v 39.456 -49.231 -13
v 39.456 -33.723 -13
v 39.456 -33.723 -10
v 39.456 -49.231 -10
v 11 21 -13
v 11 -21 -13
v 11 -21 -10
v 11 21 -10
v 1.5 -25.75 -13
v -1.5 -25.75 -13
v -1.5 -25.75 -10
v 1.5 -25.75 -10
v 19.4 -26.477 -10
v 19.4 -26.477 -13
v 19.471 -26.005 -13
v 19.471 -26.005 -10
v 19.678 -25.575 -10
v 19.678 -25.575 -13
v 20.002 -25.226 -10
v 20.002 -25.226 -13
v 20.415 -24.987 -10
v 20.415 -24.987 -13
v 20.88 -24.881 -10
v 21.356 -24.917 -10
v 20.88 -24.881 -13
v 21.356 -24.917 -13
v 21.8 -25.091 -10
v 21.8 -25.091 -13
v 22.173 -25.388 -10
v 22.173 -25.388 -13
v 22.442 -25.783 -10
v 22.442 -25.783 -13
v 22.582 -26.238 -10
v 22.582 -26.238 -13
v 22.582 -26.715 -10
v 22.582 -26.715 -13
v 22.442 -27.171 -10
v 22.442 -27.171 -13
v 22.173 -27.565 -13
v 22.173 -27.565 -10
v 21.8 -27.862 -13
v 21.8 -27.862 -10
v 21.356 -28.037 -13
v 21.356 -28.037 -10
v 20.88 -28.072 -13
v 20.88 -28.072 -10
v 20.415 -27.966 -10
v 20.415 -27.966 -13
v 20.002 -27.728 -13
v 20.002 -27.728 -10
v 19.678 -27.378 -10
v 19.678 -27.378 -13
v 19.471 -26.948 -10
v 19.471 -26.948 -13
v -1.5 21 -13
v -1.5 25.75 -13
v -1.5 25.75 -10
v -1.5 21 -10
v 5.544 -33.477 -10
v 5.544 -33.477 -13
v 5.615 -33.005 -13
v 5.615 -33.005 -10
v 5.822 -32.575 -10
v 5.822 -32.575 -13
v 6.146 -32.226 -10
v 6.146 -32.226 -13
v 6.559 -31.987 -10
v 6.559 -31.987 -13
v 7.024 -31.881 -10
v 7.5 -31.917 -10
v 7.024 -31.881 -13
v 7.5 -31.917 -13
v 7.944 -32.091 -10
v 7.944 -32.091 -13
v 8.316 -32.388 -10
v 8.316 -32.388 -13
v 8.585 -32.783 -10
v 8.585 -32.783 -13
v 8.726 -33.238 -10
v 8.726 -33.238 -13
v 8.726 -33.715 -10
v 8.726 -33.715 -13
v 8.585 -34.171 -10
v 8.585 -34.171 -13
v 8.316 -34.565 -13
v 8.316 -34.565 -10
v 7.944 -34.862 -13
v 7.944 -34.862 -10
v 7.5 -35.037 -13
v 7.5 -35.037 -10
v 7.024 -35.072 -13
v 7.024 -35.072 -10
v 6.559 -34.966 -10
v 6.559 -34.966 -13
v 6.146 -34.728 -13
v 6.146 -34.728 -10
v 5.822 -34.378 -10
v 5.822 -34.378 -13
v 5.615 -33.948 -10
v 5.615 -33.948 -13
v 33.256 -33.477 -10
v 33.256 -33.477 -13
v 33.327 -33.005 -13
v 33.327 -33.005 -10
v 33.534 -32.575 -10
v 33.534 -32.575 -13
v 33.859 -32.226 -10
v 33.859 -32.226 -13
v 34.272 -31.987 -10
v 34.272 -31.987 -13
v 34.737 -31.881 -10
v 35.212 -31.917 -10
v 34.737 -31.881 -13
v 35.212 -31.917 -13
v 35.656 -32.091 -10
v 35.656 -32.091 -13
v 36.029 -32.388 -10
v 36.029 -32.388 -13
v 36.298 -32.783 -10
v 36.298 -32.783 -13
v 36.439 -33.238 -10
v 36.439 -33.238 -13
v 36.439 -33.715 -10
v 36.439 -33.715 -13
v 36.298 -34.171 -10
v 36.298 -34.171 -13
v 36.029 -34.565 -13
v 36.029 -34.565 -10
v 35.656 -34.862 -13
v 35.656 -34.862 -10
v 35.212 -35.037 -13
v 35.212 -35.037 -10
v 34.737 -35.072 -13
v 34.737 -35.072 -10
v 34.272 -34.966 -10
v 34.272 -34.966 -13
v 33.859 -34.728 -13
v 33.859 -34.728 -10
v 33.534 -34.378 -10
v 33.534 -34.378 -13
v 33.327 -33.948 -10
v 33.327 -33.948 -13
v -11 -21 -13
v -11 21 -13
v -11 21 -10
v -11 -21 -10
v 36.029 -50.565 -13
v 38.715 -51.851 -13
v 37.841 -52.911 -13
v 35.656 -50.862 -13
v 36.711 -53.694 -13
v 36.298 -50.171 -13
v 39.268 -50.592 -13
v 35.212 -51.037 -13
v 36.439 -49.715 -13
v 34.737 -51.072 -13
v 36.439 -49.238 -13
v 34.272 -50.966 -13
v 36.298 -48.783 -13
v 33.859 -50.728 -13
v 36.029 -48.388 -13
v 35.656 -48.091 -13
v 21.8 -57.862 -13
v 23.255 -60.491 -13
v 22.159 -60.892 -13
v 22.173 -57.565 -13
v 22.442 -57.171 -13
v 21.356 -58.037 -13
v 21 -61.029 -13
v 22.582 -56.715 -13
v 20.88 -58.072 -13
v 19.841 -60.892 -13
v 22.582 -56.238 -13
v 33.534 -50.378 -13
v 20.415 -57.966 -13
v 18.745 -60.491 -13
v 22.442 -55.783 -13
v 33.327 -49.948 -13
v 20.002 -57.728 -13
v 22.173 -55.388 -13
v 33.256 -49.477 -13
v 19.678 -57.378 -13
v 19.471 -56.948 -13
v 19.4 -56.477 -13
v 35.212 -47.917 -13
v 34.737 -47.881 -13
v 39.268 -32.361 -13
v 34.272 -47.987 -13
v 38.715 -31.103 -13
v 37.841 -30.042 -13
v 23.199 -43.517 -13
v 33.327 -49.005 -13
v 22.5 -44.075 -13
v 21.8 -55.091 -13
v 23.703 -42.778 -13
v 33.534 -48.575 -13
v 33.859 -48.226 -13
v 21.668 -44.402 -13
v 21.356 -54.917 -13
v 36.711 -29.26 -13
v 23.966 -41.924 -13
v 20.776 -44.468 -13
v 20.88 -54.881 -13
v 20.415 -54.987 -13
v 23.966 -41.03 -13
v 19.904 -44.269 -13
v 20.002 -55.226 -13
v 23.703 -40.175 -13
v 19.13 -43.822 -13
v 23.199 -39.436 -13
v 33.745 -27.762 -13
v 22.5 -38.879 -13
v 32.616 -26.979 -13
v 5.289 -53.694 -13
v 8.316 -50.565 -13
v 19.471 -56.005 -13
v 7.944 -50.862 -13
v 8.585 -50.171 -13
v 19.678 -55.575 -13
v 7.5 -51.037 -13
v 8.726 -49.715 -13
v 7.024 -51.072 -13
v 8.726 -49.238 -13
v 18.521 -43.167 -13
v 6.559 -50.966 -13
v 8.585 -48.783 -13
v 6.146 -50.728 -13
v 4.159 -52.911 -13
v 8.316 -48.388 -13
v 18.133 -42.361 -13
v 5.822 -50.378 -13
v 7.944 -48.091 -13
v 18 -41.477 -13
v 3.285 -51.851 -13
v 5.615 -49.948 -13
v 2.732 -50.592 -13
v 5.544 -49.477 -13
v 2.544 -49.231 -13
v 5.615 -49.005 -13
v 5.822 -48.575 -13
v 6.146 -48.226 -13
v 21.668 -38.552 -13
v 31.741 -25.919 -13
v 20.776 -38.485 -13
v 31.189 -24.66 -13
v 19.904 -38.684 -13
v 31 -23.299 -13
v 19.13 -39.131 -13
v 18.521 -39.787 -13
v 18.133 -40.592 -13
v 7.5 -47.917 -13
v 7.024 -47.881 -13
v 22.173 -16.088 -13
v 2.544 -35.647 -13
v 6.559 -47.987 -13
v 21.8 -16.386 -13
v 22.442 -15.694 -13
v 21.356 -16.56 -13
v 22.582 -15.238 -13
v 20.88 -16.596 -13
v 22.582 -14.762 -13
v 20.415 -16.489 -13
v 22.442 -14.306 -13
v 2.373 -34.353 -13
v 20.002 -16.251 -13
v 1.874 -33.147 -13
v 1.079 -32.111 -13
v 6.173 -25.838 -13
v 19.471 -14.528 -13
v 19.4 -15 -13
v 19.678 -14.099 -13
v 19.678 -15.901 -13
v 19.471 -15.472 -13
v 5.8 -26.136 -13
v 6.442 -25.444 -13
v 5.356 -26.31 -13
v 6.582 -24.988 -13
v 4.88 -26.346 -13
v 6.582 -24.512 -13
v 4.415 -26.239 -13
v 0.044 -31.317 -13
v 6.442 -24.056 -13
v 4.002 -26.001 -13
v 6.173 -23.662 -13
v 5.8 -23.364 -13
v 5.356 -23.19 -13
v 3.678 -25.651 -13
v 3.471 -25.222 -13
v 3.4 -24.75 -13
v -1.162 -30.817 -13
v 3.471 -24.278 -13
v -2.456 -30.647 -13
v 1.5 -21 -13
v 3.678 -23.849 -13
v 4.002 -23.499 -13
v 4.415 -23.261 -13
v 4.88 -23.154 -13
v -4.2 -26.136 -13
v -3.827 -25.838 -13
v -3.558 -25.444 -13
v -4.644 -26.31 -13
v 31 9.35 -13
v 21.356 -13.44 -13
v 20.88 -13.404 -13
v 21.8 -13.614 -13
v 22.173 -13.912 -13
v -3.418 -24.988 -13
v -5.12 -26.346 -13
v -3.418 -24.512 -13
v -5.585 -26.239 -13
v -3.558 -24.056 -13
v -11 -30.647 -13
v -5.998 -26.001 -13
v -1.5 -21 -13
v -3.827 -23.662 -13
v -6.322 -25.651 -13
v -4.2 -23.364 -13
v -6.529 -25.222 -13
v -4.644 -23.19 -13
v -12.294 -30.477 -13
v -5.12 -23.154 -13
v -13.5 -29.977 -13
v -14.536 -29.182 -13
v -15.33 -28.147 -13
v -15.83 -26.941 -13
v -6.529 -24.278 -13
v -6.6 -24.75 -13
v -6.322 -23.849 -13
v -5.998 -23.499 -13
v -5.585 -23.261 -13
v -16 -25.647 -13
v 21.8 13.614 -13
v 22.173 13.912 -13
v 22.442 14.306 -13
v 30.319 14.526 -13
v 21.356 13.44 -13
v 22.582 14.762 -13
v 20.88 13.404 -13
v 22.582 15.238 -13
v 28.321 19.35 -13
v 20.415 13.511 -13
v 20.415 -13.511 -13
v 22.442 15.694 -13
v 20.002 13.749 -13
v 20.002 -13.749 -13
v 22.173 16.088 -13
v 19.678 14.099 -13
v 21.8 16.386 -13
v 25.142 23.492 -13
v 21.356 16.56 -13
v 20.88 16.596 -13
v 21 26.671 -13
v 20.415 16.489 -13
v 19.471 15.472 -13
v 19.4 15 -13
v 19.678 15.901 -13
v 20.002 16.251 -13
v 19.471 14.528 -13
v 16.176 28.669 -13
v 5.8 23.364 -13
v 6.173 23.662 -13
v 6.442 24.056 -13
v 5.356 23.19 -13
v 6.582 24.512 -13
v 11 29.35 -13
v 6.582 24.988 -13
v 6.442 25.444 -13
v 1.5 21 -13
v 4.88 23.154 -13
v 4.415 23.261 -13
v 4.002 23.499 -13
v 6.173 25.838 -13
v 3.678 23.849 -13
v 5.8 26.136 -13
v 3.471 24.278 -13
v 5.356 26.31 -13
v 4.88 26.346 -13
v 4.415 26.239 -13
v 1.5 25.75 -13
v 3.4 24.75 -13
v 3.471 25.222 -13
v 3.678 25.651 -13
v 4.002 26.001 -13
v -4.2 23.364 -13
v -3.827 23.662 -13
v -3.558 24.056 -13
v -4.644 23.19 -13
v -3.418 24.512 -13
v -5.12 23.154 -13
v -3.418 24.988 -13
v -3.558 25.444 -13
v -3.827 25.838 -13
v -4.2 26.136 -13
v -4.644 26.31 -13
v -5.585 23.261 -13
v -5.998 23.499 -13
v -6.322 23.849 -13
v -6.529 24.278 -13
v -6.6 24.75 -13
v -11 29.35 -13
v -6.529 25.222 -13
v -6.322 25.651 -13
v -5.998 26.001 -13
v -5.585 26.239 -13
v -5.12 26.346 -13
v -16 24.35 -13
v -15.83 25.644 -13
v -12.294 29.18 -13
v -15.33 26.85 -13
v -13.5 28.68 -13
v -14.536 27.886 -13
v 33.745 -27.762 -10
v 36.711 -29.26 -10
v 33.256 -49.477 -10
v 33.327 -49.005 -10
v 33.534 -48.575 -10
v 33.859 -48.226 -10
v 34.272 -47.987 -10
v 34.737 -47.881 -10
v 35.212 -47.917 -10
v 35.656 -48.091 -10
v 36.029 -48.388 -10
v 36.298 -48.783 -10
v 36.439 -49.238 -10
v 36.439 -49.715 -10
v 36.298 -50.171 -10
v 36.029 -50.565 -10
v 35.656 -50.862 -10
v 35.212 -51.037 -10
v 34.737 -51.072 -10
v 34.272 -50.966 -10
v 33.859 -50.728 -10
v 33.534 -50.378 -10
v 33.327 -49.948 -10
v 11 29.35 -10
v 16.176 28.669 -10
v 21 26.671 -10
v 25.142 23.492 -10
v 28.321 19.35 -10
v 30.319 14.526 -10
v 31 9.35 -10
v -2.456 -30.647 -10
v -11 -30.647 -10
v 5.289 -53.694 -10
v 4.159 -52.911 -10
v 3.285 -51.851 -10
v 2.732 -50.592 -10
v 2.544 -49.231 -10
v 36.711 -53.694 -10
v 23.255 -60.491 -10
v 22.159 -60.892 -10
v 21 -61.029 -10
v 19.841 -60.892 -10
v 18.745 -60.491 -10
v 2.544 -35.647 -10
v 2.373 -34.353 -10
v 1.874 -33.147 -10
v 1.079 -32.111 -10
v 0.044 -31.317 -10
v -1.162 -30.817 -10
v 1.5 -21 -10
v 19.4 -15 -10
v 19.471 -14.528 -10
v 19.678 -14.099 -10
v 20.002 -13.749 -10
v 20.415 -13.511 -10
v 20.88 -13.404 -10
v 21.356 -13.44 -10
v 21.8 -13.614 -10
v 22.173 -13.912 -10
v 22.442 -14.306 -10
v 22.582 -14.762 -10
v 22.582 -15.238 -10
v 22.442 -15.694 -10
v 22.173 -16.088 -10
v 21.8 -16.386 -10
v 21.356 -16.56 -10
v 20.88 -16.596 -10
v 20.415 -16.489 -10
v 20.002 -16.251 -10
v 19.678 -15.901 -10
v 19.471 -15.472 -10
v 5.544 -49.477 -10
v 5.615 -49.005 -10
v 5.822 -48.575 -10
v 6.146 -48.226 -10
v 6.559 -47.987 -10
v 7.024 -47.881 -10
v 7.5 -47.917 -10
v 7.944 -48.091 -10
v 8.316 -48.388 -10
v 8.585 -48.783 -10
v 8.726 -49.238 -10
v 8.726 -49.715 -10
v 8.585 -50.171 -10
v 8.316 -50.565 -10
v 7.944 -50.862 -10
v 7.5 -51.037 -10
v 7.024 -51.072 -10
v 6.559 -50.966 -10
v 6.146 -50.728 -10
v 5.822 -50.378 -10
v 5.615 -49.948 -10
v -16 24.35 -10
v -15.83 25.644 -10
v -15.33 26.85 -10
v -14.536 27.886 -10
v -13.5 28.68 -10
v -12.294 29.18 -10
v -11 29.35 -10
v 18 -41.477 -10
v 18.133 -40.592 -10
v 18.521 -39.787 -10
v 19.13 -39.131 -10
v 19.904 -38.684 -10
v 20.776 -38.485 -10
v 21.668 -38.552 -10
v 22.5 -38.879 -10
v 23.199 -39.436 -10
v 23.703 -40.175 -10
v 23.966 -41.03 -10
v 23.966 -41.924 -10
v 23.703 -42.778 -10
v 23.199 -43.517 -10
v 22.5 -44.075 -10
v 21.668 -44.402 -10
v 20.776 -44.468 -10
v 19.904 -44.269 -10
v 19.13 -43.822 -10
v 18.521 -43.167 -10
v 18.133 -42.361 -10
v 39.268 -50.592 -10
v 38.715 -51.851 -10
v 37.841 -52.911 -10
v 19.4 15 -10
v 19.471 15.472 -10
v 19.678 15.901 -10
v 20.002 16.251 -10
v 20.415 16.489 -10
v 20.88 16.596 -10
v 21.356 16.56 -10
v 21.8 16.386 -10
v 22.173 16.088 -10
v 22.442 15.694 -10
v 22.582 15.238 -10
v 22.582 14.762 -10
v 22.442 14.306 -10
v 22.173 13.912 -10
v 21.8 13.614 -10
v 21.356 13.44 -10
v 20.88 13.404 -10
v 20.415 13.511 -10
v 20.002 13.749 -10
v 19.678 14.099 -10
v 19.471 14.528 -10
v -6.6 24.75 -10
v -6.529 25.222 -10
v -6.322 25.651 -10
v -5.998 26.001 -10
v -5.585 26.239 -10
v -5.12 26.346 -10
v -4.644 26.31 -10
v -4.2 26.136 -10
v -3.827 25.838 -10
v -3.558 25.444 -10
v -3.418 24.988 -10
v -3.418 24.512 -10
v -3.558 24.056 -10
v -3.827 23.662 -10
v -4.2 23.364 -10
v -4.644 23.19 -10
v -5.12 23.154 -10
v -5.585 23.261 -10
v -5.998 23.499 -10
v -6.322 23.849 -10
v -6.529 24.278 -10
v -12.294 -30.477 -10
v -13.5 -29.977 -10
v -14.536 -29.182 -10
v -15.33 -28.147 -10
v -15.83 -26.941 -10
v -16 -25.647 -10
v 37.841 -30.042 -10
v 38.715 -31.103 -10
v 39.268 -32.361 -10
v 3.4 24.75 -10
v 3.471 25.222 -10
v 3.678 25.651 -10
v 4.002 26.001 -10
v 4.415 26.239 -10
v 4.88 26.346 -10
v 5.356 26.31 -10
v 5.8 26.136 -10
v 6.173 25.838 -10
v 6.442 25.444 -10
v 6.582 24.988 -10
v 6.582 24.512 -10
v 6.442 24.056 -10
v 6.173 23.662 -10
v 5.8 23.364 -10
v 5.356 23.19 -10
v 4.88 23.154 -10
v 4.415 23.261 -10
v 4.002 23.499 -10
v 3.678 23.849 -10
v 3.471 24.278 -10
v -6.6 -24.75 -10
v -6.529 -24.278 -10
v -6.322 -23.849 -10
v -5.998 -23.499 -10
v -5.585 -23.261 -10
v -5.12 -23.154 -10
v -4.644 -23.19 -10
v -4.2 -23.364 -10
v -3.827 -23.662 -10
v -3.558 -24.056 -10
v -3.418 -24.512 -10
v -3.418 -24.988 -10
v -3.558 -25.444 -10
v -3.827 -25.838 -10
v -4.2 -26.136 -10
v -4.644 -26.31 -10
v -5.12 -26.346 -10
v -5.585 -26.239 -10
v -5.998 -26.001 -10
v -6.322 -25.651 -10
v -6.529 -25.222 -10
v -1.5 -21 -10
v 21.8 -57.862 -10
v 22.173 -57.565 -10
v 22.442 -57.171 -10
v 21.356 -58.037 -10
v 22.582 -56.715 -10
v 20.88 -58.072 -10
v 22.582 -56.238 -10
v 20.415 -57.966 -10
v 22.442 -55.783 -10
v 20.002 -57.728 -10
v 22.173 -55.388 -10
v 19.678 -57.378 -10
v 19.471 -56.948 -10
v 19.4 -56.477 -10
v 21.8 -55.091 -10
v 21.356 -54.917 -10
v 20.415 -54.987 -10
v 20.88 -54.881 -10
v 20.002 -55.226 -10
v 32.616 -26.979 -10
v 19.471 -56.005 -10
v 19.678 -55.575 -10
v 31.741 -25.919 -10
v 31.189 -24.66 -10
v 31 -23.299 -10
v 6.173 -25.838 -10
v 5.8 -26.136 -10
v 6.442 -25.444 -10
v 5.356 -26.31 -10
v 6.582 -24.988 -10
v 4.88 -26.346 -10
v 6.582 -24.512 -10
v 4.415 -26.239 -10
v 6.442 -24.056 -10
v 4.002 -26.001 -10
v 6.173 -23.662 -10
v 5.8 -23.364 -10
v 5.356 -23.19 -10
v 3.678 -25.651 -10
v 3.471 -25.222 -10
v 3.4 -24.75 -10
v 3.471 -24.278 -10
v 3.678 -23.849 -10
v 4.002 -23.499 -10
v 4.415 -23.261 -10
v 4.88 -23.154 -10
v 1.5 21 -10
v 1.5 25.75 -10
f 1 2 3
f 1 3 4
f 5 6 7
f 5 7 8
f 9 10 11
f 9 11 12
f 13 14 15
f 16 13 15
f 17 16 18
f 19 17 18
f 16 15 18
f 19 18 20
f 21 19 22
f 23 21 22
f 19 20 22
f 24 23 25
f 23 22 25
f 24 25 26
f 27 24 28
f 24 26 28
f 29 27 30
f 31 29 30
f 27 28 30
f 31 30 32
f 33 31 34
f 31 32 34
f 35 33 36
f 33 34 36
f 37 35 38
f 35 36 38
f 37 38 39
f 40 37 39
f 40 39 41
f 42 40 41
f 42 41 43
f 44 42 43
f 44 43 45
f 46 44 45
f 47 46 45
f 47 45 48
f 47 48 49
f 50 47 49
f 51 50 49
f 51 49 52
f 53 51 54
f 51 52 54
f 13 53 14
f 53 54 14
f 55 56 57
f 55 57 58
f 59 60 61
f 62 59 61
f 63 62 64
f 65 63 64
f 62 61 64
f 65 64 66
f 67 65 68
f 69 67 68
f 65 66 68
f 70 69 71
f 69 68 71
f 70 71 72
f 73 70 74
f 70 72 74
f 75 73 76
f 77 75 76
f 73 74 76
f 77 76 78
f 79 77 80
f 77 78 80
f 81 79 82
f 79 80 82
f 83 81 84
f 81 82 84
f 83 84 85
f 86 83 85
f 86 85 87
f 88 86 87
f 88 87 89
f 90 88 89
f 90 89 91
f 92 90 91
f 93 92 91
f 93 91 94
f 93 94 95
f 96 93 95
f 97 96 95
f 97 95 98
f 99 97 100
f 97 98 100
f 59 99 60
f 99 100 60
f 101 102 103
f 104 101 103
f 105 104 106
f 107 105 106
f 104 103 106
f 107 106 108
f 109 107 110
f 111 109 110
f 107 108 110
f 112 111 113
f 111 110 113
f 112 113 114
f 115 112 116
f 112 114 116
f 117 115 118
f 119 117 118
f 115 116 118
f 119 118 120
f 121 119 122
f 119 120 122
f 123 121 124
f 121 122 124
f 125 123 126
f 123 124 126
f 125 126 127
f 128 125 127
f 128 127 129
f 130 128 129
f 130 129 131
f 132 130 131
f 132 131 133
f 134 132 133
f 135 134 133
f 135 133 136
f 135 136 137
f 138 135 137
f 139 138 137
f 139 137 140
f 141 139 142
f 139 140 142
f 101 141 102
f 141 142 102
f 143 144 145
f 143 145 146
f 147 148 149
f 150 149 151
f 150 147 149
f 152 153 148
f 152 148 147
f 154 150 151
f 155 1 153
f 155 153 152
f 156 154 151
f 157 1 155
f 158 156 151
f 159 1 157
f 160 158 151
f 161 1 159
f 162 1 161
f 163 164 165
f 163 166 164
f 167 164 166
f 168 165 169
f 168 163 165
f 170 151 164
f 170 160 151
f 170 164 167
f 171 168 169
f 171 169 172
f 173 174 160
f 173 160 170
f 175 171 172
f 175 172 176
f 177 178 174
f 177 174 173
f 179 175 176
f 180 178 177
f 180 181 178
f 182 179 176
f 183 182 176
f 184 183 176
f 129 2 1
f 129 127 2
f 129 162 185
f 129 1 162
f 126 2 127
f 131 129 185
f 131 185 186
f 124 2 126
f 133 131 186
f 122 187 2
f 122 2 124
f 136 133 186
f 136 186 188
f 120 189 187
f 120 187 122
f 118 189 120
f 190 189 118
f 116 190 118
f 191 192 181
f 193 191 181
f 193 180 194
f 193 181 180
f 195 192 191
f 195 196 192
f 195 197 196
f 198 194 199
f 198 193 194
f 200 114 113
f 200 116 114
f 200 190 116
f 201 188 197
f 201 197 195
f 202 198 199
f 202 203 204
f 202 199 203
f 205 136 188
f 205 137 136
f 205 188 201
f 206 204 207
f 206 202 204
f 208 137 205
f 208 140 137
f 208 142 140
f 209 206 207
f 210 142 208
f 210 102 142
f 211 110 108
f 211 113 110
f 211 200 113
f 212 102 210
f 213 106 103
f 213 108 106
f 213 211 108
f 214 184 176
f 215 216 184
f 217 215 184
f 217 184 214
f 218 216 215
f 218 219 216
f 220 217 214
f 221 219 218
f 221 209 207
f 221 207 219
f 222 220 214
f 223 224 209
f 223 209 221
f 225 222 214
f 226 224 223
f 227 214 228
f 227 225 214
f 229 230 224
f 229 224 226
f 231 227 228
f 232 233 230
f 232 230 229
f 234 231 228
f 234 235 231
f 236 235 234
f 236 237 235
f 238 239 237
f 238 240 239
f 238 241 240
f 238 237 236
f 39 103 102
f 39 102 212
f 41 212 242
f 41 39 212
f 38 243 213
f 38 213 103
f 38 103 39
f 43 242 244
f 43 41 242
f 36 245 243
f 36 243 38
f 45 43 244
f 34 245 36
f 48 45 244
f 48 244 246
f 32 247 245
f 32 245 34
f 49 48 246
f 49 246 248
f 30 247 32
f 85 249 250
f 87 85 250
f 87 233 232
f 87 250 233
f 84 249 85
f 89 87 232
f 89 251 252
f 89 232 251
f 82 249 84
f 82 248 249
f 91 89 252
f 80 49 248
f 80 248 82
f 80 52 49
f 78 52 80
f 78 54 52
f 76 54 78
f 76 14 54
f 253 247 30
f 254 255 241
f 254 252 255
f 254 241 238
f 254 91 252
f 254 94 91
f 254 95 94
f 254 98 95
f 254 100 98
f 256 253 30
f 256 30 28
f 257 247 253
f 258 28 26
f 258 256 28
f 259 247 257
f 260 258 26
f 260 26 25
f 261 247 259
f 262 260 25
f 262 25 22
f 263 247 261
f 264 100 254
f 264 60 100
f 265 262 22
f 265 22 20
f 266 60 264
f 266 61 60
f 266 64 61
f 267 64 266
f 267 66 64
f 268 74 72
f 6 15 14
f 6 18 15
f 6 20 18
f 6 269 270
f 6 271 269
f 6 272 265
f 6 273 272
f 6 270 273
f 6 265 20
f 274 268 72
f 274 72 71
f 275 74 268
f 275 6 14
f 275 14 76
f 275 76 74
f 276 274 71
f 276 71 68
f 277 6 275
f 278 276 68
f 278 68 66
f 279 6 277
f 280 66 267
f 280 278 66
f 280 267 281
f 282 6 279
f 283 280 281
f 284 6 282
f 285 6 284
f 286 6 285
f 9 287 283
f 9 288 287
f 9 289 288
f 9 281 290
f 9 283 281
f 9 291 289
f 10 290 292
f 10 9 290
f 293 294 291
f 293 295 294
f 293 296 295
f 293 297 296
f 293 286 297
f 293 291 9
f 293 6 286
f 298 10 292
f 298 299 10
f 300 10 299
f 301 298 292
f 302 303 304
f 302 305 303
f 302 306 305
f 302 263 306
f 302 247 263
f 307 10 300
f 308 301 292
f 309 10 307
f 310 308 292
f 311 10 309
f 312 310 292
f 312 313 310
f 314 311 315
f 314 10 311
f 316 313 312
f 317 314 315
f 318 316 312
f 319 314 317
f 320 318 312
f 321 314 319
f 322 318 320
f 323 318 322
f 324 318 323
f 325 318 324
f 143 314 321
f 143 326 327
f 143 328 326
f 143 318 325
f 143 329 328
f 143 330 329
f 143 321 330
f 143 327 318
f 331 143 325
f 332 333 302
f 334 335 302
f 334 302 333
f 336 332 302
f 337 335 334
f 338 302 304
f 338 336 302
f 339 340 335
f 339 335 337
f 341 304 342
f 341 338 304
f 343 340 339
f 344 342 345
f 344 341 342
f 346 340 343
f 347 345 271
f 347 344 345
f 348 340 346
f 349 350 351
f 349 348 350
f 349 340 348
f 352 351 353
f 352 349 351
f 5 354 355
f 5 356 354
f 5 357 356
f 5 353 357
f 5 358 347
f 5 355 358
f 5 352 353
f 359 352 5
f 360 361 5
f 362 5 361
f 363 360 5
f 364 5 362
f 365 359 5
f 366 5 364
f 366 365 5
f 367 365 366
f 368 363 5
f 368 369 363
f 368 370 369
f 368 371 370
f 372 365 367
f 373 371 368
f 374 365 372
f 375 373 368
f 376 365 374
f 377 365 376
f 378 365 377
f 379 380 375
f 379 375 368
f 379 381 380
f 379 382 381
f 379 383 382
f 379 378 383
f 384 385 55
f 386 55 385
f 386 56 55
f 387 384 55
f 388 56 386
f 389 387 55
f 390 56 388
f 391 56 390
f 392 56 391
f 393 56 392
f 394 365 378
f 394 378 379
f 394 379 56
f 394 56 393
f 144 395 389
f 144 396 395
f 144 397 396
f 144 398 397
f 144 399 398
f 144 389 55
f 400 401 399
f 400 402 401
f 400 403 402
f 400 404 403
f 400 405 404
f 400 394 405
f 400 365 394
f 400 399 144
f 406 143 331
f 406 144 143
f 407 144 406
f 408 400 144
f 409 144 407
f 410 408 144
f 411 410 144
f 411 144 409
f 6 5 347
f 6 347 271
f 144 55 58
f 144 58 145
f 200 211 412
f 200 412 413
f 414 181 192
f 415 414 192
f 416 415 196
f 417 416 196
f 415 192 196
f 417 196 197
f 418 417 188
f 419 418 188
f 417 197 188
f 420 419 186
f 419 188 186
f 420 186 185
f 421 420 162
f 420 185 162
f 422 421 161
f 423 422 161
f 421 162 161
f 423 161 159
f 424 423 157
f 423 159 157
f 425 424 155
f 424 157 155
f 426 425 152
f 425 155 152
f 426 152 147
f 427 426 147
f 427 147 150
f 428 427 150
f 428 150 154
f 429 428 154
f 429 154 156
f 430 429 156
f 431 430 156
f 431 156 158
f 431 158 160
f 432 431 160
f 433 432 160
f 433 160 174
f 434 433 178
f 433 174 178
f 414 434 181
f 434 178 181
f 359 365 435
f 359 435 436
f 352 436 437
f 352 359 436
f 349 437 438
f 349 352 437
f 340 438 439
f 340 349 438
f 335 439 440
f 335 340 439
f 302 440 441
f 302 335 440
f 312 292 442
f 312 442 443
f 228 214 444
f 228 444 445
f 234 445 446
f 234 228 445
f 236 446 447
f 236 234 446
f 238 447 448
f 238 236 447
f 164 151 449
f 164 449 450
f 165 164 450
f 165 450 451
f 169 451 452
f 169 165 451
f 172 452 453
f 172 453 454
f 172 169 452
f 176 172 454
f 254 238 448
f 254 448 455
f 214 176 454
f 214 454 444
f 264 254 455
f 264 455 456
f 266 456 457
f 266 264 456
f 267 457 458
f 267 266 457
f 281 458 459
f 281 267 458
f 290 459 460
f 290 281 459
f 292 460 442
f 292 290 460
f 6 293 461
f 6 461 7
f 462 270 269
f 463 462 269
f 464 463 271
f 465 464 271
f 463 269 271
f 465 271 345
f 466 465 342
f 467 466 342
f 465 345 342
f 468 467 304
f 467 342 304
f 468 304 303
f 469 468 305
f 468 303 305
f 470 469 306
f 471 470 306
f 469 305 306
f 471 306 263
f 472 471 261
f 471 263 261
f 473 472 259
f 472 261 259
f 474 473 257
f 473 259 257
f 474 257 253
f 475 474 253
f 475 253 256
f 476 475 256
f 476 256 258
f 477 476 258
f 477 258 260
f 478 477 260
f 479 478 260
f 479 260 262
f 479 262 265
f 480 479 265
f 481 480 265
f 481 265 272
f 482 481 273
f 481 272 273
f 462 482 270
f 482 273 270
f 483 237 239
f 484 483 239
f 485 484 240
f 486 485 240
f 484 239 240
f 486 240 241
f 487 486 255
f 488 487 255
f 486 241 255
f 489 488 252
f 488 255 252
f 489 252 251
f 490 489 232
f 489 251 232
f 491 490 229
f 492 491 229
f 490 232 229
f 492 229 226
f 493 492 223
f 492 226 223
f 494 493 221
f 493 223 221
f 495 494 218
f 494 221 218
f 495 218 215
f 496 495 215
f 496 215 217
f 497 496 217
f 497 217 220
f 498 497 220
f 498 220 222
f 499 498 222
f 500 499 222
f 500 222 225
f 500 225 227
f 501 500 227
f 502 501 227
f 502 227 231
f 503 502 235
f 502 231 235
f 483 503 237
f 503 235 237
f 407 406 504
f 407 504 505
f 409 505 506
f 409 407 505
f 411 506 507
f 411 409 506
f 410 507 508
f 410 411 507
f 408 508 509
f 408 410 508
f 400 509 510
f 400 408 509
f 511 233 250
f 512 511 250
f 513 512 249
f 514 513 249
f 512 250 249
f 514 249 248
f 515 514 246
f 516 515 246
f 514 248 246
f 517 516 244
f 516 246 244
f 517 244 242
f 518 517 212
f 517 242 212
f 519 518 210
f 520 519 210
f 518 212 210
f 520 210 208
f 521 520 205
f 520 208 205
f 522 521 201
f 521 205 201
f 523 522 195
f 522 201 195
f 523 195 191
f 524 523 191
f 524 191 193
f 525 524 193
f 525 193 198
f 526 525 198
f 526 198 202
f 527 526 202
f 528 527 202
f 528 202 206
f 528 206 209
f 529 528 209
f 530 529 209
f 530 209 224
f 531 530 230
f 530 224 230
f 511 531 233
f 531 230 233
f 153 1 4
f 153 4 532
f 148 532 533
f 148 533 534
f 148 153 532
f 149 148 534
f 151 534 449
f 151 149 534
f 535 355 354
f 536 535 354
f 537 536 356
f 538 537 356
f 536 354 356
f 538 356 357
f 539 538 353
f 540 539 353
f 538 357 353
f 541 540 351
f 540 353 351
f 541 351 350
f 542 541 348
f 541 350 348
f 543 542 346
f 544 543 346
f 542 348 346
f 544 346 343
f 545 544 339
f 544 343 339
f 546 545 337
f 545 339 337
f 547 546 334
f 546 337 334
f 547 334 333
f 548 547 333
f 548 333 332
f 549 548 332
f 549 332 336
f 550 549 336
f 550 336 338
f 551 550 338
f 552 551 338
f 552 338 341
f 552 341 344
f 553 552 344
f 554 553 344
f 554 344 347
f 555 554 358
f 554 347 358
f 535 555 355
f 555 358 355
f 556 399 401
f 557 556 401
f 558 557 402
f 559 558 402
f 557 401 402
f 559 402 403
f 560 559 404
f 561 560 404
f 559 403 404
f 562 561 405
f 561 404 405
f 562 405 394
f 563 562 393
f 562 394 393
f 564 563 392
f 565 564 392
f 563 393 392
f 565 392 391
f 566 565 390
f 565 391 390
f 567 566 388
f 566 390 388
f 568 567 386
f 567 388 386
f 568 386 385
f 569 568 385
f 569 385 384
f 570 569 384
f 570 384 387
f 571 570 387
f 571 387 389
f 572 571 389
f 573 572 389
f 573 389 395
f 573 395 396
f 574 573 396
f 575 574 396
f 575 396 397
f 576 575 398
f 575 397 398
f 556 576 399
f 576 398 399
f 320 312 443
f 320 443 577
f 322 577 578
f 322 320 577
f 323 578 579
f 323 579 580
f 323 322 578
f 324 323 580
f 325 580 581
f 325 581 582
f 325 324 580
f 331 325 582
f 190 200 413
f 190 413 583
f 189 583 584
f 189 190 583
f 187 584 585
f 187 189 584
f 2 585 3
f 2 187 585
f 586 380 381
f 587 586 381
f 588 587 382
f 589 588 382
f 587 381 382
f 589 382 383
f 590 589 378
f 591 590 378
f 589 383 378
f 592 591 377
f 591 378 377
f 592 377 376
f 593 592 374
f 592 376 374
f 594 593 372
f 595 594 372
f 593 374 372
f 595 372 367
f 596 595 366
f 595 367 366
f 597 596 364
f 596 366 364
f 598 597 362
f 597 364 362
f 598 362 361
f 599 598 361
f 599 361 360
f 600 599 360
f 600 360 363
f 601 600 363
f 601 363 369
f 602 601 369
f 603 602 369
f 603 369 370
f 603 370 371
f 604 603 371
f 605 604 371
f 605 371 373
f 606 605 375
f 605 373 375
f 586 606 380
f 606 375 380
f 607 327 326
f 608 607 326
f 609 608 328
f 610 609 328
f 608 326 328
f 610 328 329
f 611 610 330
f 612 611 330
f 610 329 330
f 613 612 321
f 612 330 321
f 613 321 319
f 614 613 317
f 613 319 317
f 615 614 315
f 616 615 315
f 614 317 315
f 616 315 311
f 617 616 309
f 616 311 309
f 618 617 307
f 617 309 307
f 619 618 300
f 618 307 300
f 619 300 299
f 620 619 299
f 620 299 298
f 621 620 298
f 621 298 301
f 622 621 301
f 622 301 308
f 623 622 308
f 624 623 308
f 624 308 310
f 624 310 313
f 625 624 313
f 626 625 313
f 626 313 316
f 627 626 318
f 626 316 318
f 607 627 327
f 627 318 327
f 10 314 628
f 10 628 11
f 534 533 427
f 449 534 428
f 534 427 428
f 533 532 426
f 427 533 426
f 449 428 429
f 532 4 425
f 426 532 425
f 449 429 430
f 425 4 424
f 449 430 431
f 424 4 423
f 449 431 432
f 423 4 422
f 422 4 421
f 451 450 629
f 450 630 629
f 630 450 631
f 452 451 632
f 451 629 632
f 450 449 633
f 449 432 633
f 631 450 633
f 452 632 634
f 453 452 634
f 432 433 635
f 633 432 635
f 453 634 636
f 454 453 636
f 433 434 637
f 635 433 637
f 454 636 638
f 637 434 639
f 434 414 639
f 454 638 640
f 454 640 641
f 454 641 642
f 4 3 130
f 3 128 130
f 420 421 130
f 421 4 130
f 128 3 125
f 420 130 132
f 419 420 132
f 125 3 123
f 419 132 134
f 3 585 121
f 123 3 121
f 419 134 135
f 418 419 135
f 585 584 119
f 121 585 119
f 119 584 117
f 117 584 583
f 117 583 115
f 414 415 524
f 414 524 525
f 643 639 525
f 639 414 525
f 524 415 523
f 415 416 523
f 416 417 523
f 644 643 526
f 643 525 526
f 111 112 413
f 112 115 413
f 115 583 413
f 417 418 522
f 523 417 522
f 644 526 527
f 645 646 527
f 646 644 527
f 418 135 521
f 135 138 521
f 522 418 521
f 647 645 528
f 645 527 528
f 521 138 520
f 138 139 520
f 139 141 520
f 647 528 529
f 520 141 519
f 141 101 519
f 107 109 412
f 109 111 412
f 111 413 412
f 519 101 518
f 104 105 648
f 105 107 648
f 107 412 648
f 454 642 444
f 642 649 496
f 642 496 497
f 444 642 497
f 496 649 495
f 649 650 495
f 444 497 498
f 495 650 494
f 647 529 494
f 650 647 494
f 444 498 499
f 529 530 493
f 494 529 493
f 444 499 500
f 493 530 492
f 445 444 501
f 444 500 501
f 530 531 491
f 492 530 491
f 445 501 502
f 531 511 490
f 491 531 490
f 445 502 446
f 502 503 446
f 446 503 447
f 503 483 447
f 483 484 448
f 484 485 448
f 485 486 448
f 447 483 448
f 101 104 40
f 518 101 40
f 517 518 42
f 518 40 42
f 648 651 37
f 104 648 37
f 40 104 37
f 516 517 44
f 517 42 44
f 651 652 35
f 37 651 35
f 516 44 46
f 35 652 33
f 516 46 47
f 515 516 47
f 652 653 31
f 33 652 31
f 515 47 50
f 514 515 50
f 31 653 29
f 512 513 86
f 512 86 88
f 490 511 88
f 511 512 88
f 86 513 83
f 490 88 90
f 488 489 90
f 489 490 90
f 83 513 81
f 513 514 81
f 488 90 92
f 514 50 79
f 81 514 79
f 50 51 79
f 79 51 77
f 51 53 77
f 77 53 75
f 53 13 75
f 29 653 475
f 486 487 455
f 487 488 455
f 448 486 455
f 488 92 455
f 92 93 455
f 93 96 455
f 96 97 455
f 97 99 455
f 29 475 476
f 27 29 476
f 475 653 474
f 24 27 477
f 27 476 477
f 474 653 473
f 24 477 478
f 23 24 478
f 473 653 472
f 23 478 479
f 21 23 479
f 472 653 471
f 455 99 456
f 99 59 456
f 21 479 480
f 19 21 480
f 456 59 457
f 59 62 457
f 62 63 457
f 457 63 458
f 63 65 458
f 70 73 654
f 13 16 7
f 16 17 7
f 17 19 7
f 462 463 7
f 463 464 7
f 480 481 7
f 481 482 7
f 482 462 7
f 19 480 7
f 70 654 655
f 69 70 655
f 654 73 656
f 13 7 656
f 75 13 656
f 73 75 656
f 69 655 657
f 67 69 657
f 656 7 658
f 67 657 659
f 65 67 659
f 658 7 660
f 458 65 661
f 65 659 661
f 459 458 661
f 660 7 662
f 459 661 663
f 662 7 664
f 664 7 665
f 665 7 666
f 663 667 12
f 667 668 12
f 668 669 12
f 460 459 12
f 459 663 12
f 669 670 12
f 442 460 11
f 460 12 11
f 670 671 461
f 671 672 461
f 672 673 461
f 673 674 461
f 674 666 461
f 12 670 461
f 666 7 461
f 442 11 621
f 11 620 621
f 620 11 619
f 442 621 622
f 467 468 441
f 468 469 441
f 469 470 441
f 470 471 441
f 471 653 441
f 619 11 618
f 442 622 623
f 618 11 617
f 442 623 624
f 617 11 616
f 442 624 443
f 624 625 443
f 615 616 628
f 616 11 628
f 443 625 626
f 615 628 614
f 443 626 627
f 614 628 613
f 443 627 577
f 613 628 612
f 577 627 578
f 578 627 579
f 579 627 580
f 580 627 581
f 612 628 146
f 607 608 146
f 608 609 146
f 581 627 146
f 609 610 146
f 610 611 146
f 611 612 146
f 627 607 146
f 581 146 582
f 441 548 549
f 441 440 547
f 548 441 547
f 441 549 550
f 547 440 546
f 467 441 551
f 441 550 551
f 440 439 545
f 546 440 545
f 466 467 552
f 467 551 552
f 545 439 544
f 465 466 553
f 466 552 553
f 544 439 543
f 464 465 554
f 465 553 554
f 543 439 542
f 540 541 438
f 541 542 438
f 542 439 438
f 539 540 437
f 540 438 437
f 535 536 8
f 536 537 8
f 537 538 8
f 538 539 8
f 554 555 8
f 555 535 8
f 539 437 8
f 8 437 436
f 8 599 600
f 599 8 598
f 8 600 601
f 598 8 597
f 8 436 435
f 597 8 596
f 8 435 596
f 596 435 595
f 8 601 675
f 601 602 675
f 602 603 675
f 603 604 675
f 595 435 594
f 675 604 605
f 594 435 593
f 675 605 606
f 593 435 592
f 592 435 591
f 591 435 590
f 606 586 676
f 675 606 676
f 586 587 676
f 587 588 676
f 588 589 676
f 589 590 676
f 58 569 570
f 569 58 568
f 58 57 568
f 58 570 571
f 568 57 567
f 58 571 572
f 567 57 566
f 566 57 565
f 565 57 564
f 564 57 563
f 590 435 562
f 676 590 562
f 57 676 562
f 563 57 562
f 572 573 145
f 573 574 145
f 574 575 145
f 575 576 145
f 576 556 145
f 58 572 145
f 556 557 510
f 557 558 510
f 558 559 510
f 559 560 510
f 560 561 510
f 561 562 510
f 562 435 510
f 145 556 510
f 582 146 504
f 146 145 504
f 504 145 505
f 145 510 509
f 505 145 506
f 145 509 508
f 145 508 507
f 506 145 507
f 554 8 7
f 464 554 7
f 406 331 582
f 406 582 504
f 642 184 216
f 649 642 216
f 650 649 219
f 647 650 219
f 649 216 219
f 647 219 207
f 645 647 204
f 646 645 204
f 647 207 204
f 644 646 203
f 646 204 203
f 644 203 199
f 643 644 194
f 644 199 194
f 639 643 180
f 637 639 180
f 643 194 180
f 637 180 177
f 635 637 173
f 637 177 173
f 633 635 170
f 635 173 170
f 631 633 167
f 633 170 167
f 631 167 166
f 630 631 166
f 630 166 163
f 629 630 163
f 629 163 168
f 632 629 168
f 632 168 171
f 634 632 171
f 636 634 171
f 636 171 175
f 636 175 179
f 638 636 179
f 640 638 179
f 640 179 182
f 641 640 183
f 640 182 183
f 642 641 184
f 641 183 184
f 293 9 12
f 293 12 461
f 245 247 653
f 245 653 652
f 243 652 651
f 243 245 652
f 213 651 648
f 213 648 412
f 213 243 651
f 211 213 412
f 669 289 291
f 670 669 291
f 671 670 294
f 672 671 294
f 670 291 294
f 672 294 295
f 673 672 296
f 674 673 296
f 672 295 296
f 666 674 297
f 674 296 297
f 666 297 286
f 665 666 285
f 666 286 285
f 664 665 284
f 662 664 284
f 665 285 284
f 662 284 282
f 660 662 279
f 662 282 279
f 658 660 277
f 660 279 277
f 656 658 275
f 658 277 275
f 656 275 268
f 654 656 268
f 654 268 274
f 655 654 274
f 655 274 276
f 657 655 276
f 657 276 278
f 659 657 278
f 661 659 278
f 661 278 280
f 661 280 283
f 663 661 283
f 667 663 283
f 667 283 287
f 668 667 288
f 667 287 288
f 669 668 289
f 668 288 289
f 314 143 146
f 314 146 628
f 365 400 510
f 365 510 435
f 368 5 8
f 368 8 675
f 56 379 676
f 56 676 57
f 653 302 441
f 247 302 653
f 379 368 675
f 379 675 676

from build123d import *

# Parameters (mm, degrees)
ESBO_O1_R                = 1.6
ESBO_O1_R_2              = 3
RESSALTO_EXTRUS_O1_DEPTH = 3


with BuildPart() as part:
    # Esboço1 → Ressalto-extrusão1 (new body)
    with BuildSketch(Plane(origin=(0, 0, -13), x_dir=(-1, 0, 0), z_dir=(0, 0, -1))):
        with BuildLine():
            Line((11, 29.35), (-11, 29.35))
            ThreePointArc((-11, 29.35), (-25.142135624, 23.492135624), (-31, 9.35))
            Line((-31, 9.35), (-31, -23.298998166))
            ThreePointArc((-31, -23.298998166), (-31.741318167, -25.918851033), (-33.745451618, -27.76184609))
            Line((-33.745451618, -27.76184609), (-36.710953382, -29.259962834))
            ThreePointArc((-36.710953382, -29.259962834), (-38.715086833, -31.102957891), (-39.456405, -33.722810758))
            Line((-39.456405, -33.722810758), (-39.456405, -49.230667326))
            ThreePointArc((-39.456405, -49.230667326), (-38.715086833, -51.850520194), (-36.710953382, -53.693515251))
            Line((-36.710953382, -53.693515251), (-23.254548382, -60.491442635))
            ThreePointArc((-23.254548382, -60.491442635), (-21, -61.028594711), (-18.745451618, -60.491442635))
            Line((-18.745451618, -60.491442635), (-5.289046618, -53.693515251))
            ThreePointArc((-5.289046618, -53.693515251), (-3.284913167, -51.850520194), (-2.543595, -49.230667326))
            Line((-2.543595, -49.230667326), (-2.543595, -35.646914307))
            ThreePointArc((-2.543595, -35.646914307), (-1.079128906, -32.111380402), (2.456405, -30.646914307))
            Line((2.456405, -30.646914307), (11, -30.646914307))
            ThreePointArc((11, -30.646914307), (14.535533906, -29.182448213), (16, -25.646914307))
            Line((16, -25.646914307), (16, 24.35))
            ThreePointArc((16, 24.35), (14.535533906, 27.885533906), (11, 29.35))
        make_face()
        with Locations((-5, -24.75)):
            Circle(ESBO_O1_R, mode=Mode.SUBTRACT)
        with Locations((-5, 24.75)):
            Circle(ESBO_O1_R, mode=Mode.SUBTRACT)
        with Locations((5, -24.75)):
            Circle(ESBO_O1_R, mode=Mode.SUBTRACT)
        with Locations((5, 24.75)):
            Circle(ESBO_O1_R, mode=Mode.SUBTRACT)
        with Locations((-21, 15)):
            Circle(ESBO_O1_R, mode=Mode.SUBTRACT)
        with Locations((-21, -15)):
            Circle(ESBO_O1_R, mode=Mode.SUBTRACT)
        with Locations((-7.143595, -33.476739042)):
            Circle(ESBO_O1_R, mode=Mode.SUBTRACT)
        with Locations((-7.143595, -49.476739042)):
            Circle(ESBO_O1_R, mode=Mode.SUBTRACT)
        with Locations((-21, -26.476739042)):
            Circle(ESBO_O1_R, mode=Mode.SUBTRACT)
        with Locations((-21, -56.476739042)):
            Circle(ESBO_O1_R, mode=Mode.SUBTRACT)
        with Locations((-21, -41.476739042)):
            Circle(ESBO_O1_R_2, mode=Mode.SUBTRACT)
        with Locations((-34.856405, -33.476739042)):
            Circle(ESBO_O1_R, mode=Mode.SUBTRACT)
        with Locations((-34.856405, -49.476739042)):
            Circle(ESBO_O1_R, mode=Mode.SUBTRACT)
        Polygon((-1.5, -21), (-11, -21), (-11, 21), (-1.5, 21), (-1.5, 25.75), (1.5, 25.75), (1.5, 21), (11, 21), (11, -21), (1.5, -21), (1.5, -25.75), (-1.5, -25.75), align=None, mode=Mode.SUBTRACT)
    extrude(amount=-RESSALTO_EXTRUS_O1_DEPTH)


solid = part.part
